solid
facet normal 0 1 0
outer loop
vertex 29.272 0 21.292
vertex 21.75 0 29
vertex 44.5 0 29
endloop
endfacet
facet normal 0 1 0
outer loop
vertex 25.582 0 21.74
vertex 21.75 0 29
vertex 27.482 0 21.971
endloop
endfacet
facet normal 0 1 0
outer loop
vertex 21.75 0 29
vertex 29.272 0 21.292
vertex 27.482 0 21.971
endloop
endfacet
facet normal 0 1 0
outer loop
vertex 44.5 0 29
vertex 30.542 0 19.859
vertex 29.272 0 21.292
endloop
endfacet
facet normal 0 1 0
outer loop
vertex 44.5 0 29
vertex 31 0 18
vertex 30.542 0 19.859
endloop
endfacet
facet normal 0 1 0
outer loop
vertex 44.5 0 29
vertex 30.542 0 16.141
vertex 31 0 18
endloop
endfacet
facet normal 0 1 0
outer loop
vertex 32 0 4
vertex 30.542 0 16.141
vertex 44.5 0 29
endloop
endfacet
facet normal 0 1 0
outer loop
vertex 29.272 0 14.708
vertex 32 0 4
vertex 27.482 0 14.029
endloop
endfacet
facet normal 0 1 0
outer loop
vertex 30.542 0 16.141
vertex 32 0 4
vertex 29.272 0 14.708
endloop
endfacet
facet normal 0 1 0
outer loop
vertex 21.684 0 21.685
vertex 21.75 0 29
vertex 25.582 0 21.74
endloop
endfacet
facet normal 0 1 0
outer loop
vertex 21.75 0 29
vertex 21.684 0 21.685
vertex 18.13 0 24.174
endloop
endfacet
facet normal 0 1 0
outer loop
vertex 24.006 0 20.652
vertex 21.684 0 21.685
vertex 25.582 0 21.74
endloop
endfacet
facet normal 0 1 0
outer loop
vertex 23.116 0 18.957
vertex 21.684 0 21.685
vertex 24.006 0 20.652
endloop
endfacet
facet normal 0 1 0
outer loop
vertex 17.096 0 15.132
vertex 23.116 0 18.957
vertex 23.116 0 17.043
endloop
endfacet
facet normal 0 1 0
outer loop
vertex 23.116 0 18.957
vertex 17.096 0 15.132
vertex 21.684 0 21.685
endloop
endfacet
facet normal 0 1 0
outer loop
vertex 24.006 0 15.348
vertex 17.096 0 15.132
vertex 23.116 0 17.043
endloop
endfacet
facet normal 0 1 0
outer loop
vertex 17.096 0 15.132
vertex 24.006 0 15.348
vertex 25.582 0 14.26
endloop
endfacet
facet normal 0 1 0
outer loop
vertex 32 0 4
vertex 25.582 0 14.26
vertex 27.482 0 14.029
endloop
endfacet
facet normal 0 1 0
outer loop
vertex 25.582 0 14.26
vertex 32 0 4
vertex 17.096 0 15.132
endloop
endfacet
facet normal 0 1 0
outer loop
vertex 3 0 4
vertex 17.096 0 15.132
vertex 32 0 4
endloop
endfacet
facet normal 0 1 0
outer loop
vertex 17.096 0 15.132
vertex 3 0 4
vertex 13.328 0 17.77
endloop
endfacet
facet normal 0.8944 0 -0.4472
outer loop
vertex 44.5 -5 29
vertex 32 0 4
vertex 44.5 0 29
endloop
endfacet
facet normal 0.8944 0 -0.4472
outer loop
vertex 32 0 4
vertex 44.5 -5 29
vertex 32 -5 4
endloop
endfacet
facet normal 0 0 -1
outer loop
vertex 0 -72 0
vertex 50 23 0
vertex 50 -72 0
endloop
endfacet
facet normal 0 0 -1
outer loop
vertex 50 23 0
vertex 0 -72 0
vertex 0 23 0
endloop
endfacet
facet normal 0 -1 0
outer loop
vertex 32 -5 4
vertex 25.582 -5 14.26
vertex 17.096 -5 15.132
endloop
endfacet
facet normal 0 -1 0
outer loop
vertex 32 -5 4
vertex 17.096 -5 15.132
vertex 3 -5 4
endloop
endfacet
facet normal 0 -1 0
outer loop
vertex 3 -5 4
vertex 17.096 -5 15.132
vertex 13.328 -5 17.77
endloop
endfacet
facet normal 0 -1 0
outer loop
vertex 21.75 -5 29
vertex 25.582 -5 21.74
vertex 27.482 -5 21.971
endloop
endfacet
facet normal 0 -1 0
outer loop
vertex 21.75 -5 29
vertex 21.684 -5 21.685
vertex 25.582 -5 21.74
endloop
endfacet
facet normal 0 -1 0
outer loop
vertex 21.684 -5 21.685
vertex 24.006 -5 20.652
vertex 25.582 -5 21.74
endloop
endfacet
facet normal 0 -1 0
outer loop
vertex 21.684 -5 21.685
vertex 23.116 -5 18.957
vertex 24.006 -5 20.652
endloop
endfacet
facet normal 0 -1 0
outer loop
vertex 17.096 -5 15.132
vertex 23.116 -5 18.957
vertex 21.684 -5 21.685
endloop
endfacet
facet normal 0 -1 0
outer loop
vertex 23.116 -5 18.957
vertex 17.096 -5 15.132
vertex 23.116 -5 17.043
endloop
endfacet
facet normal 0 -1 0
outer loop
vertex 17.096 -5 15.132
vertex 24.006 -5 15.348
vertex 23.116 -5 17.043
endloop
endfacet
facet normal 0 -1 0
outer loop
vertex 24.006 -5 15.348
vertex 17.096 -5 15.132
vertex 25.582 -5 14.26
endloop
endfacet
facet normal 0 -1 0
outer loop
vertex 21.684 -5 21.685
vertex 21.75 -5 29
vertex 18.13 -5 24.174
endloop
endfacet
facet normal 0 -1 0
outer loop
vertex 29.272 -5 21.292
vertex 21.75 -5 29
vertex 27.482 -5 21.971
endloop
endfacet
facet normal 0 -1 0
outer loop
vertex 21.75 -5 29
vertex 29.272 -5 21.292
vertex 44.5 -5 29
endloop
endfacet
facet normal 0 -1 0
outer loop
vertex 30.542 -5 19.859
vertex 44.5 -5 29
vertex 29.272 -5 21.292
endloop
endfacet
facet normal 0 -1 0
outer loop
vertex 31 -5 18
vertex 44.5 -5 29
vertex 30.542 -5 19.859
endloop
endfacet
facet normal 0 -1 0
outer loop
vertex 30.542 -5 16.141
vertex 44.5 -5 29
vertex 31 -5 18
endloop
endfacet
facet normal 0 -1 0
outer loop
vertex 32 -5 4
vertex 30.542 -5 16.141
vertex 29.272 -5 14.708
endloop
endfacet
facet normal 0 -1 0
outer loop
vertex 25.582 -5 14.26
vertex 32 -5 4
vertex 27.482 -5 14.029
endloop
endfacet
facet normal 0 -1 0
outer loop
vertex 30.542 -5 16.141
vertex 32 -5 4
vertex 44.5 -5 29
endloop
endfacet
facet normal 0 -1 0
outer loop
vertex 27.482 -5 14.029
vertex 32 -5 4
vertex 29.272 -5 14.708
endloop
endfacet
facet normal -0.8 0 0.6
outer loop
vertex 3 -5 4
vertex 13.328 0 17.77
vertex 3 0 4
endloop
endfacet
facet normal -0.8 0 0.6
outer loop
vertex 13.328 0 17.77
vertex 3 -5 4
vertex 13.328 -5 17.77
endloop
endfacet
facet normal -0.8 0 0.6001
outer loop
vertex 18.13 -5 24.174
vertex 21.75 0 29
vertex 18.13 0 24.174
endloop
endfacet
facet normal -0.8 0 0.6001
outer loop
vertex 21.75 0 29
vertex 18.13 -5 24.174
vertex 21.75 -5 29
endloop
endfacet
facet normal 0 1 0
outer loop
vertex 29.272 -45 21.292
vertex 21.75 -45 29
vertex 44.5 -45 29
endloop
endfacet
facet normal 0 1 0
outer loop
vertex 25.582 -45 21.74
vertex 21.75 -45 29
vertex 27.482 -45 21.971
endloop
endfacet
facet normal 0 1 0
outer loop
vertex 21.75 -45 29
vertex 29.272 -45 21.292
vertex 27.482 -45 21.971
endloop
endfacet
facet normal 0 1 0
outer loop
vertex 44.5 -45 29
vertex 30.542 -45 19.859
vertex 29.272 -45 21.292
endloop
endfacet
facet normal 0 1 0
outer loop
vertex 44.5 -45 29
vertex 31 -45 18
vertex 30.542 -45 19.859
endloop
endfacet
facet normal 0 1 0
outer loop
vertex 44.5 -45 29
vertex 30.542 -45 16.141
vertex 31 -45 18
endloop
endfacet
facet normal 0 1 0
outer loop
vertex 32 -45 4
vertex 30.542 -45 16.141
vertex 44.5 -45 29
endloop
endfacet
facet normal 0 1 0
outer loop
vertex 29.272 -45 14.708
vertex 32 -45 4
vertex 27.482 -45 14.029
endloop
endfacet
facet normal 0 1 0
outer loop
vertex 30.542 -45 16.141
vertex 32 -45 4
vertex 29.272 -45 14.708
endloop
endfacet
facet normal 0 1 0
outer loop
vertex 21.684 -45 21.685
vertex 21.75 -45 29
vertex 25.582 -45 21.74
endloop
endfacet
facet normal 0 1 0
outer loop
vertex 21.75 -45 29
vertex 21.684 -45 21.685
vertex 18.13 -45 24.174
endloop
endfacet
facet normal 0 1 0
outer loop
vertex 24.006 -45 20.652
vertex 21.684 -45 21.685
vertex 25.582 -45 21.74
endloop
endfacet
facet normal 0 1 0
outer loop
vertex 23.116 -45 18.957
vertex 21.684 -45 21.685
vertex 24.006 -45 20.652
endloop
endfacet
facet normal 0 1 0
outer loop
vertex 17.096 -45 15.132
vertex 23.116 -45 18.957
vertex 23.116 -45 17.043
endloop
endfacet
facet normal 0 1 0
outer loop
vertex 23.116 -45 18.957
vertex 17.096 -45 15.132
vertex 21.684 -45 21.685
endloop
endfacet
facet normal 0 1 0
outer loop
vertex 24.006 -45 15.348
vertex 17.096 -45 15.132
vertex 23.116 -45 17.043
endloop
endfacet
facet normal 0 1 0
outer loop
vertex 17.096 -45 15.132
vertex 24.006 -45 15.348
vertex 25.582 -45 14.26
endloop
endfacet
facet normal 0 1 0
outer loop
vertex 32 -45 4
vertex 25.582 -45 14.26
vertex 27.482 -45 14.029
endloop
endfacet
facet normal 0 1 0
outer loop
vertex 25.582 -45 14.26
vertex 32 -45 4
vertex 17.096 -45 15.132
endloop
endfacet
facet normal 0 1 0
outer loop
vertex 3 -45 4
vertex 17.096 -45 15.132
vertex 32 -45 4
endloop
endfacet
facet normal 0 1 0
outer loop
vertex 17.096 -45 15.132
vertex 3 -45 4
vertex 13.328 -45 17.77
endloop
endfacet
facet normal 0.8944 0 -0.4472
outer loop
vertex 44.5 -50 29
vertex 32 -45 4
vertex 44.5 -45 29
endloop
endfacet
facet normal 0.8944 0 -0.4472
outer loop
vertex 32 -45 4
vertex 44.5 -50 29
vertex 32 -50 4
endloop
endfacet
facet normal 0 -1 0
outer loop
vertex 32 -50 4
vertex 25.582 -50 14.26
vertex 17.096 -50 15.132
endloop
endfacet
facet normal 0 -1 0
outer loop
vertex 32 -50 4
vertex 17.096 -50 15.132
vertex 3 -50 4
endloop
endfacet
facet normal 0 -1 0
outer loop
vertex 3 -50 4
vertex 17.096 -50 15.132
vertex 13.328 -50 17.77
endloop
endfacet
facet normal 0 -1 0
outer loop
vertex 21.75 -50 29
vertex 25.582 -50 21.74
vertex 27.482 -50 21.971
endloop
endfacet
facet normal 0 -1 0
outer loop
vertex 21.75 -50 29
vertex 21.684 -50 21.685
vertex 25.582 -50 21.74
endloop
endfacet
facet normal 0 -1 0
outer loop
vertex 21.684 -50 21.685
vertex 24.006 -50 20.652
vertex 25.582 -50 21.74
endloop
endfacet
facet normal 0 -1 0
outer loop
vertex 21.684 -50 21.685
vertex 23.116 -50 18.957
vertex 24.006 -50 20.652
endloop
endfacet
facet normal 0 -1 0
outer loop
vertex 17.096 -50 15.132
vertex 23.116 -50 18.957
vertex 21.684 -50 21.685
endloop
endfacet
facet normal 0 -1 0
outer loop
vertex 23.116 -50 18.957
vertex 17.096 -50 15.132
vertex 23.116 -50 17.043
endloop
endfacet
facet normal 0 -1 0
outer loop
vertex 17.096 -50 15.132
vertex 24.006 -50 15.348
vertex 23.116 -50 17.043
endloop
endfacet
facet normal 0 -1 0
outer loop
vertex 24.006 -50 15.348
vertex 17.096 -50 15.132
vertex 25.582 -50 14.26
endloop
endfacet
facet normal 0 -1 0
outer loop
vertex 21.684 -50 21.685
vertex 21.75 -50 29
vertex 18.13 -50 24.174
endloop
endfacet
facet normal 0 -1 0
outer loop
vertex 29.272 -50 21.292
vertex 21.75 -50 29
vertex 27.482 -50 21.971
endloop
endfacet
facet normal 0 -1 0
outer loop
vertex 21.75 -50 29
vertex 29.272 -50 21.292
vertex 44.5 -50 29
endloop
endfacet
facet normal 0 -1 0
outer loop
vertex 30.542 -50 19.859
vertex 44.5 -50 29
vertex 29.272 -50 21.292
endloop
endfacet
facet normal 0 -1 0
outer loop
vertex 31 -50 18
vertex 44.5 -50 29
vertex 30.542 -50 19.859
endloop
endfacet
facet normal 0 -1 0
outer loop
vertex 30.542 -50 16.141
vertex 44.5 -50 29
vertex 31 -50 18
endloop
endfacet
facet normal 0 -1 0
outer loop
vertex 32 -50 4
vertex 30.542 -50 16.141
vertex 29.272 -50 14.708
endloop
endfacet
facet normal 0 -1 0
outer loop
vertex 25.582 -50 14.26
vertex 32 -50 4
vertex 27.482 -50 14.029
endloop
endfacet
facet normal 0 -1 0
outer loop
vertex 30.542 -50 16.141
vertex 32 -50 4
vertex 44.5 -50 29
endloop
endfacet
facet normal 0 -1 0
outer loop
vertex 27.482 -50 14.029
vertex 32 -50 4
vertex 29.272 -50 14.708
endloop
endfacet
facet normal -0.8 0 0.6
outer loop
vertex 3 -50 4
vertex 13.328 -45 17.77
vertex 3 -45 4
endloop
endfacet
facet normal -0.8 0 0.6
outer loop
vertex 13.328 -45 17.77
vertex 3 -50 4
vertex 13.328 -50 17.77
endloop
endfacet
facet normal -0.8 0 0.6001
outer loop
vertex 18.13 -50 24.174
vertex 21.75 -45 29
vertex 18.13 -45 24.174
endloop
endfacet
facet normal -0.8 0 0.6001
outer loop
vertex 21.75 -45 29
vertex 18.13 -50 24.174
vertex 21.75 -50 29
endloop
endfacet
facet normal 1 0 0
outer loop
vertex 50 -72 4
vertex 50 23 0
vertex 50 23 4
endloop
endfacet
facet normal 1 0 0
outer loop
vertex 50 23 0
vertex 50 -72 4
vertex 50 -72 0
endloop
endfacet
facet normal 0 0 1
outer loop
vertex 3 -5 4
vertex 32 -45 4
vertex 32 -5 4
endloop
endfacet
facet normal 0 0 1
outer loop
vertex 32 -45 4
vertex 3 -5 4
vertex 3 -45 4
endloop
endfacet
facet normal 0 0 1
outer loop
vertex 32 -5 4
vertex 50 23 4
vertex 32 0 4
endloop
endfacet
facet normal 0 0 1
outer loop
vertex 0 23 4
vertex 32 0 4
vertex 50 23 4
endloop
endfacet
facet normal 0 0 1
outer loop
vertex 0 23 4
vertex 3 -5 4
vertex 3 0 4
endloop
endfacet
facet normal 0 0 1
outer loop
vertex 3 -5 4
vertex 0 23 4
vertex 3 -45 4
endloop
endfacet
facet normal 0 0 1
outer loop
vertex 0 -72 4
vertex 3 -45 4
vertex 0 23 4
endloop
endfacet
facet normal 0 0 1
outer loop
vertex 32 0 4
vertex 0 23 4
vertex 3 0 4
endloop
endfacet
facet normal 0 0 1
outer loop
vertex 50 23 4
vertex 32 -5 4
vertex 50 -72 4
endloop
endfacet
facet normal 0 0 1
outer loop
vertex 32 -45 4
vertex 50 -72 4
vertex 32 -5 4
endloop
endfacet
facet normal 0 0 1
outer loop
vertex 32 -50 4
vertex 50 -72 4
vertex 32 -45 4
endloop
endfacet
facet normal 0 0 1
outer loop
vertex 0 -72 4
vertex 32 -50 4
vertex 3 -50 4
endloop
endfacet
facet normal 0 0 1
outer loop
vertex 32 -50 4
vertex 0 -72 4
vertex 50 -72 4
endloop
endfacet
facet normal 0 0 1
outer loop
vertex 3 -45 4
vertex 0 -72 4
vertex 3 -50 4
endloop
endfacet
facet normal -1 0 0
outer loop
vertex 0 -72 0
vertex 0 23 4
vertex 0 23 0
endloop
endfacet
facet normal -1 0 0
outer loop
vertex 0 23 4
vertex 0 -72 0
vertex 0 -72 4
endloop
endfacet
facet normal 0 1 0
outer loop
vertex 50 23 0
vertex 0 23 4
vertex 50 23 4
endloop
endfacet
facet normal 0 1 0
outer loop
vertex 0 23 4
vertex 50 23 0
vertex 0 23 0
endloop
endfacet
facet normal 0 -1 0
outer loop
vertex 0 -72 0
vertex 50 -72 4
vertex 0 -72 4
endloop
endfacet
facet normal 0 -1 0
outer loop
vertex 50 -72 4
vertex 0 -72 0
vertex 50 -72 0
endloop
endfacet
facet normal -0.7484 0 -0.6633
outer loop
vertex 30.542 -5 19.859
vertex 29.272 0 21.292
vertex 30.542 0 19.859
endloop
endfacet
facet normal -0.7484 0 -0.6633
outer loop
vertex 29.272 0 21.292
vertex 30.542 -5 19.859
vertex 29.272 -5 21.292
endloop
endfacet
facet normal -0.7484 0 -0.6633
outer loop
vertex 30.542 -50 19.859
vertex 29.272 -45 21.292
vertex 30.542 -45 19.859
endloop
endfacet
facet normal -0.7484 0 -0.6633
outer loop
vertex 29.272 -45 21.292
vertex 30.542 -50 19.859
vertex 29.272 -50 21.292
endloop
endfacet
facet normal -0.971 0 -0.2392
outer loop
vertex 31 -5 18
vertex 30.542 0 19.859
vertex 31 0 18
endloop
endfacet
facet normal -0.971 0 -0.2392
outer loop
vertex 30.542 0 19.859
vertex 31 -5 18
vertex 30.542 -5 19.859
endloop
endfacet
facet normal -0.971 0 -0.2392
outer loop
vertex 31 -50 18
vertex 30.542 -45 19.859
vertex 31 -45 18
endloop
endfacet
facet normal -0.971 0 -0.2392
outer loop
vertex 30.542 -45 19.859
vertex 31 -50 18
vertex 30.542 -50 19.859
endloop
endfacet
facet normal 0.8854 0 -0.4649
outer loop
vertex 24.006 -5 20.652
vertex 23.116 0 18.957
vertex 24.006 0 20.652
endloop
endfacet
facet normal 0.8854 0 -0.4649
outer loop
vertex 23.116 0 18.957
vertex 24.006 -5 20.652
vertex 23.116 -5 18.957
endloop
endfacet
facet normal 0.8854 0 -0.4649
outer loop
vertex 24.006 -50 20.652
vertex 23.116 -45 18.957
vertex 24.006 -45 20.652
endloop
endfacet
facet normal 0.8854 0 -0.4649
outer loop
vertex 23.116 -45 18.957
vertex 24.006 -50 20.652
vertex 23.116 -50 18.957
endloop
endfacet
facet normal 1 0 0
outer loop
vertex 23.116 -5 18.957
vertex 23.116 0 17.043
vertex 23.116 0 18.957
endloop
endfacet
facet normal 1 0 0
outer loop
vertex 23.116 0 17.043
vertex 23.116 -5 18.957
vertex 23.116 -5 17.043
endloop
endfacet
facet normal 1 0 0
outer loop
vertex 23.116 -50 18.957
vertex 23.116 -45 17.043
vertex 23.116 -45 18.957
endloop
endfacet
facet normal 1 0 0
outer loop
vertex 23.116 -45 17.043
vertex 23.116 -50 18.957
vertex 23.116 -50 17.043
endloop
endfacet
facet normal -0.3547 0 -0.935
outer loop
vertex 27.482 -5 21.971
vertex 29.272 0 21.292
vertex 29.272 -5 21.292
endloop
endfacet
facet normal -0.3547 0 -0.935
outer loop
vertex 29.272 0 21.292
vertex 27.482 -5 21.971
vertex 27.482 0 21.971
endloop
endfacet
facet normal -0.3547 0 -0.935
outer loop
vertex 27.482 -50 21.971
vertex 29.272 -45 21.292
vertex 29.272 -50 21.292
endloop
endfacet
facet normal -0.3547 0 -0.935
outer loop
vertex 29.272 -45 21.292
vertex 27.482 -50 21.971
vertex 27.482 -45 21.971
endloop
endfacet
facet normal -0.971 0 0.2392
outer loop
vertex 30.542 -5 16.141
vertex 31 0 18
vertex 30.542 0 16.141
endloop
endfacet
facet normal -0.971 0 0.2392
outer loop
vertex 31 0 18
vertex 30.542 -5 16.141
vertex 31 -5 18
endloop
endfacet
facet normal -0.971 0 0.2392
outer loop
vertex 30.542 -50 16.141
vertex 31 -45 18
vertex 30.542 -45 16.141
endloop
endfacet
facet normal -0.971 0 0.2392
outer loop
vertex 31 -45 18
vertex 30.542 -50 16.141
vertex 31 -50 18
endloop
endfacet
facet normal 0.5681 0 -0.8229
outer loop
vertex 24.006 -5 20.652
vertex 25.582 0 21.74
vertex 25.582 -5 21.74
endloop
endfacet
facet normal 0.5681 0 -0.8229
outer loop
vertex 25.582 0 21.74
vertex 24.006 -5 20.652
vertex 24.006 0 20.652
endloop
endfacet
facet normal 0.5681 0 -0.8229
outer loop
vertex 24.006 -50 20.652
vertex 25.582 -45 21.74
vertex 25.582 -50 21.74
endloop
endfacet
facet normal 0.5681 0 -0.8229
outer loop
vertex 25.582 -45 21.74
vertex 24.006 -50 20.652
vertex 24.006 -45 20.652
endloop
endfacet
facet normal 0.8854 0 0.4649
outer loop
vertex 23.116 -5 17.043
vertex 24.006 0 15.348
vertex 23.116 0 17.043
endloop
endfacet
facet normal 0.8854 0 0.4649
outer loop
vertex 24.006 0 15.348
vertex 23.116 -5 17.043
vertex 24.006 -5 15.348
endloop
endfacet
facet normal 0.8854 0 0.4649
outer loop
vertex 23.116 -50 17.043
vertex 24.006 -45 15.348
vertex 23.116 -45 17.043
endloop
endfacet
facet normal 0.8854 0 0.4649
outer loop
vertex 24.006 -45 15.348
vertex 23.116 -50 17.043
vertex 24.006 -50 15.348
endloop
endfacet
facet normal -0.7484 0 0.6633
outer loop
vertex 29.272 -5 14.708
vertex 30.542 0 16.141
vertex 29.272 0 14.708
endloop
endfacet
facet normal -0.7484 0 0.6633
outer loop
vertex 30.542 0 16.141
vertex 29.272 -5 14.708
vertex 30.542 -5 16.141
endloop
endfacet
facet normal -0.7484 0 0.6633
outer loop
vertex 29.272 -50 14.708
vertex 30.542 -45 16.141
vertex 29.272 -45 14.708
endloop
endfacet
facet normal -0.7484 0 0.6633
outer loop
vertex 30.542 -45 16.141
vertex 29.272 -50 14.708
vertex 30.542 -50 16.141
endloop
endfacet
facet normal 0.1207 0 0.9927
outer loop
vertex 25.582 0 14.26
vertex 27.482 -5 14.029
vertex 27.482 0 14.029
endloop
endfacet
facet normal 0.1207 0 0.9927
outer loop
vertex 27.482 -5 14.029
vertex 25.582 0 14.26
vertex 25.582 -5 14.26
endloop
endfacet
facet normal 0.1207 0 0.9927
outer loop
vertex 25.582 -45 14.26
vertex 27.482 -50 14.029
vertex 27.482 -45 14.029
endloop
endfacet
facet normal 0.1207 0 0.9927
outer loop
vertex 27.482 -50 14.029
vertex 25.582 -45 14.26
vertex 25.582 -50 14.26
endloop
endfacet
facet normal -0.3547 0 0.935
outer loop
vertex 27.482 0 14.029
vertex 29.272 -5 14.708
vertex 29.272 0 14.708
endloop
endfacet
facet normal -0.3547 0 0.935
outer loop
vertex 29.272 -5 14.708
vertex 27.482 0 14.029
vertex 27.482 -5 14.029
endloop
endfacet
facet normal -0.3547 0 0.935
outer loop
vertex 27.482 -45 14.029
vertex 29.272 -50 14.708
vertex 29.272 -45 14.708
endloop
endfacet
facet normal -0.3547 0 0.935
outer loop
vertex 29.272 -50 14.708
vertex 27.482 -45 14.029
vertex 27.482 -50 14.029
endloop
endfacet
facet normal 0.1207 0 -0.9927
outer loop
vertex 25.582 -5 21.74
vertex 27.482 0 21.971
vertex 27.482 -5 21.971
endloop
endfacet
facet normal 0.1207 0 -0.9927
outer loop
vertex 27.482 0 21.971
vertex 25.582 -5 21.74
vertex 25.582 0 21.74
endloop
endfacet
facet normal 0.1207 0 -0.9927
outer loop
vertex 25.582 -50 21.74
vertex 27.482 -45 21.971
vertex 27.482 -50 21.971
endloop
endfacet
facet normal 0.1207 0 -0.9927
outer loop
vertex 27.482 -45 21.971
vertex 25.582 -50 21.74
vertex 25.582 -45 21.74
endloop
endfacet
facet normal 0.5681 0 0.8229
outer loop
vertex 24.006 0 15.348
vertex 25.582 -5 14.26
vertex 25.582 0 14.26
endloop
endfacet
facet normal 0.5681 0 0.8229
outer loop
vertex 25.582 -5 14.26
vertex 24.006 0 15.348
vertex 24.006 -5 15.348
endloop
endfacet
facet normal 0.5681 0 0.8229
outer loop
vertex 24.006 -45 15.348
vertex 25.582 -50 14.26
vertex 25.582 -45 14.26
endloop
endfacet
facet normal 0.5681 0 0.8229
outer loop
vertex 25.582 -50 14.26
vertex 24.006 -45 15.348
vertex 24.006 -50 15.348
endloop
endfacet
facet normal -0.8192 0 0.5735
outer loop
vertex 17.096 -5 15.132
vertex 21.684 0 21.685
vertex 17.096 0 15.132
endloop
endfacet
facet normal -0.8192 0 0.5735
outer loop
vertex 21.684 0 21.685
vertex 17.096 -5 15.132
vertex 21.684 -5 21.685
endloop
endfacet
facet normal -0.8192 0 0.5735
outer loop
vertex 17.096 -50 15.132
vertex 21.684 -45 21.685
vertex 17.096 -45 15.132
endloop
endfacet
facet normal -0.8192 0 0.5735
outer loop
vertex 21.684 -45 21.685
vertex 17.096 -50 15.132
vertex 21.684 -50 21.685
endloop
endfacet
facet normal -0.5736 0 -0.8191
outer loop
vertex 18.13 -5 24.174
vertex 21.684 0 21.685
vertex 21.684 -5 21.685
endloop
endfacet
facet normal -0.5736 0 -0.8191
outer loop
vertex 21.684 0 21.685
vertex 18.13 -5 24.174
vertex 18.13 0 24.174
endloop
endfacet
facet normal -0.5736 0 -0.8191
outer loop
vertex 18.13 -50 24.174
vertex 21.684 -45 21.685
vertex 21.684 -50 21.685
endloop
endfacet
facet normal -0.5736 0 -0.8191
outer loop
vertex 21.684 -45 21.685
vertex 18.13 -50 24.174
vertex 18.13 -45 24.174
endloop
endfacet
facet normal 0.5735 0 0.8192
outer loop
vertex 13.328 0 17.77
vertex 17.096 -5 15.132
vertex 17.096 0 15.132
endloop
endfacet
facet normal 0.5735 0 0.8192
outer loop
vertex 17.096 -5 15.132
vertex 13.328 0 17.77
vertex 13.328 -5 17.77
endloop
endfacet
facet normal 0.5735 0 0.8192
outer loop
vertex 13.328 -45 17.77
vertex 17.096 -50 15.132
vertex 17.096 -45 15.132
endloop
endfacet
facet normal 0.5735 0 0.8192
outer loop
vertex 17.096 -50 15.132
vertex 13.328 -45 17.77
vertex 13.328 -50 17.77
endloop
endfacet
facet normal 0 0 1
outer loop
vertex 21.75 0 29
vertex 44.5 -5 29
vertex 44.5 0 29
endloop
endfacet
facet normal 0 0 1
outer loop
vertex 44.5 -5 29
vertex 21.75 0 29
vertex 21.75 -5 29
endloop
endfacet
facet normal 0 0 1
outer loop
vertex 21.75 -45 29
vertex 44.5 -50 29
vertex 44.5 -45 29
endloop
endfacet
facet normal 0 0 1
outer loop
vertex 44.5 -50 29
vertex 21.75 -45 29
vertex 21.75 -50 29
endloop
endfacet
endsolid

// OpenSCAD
difference() {
    difference() {
        //ADDITIVES
        union() {
            //ARMS
            rotate([90,0,0]){
                linear_extrude(height = 5)
                    polygon(points=[[0,0],[30,0],[50,40],[30,40]]);
                translate([0,0,45])
                    linear_extrude(height = 5)
                        polygon(points=[[0,0],[30,0],[50,40],[30,40]]); 
            } 
            //FOOT
            translate([0,-72,0])
                cube([50,95,4]);
        }

        //SUBTRACTIVES
        union() {
            //Hole for cables
            translate([27,10,18])
                rotate([90,0,0])
                    cylinder(120,4,4);
            
            translate([13,-60,18])
                rotate([125,0,90])
                    cube([71,8,5]);
        }
    }

    //MATERIAL SAVER
    translate([0,-60,29])
        cube([100,100,100]);
}
